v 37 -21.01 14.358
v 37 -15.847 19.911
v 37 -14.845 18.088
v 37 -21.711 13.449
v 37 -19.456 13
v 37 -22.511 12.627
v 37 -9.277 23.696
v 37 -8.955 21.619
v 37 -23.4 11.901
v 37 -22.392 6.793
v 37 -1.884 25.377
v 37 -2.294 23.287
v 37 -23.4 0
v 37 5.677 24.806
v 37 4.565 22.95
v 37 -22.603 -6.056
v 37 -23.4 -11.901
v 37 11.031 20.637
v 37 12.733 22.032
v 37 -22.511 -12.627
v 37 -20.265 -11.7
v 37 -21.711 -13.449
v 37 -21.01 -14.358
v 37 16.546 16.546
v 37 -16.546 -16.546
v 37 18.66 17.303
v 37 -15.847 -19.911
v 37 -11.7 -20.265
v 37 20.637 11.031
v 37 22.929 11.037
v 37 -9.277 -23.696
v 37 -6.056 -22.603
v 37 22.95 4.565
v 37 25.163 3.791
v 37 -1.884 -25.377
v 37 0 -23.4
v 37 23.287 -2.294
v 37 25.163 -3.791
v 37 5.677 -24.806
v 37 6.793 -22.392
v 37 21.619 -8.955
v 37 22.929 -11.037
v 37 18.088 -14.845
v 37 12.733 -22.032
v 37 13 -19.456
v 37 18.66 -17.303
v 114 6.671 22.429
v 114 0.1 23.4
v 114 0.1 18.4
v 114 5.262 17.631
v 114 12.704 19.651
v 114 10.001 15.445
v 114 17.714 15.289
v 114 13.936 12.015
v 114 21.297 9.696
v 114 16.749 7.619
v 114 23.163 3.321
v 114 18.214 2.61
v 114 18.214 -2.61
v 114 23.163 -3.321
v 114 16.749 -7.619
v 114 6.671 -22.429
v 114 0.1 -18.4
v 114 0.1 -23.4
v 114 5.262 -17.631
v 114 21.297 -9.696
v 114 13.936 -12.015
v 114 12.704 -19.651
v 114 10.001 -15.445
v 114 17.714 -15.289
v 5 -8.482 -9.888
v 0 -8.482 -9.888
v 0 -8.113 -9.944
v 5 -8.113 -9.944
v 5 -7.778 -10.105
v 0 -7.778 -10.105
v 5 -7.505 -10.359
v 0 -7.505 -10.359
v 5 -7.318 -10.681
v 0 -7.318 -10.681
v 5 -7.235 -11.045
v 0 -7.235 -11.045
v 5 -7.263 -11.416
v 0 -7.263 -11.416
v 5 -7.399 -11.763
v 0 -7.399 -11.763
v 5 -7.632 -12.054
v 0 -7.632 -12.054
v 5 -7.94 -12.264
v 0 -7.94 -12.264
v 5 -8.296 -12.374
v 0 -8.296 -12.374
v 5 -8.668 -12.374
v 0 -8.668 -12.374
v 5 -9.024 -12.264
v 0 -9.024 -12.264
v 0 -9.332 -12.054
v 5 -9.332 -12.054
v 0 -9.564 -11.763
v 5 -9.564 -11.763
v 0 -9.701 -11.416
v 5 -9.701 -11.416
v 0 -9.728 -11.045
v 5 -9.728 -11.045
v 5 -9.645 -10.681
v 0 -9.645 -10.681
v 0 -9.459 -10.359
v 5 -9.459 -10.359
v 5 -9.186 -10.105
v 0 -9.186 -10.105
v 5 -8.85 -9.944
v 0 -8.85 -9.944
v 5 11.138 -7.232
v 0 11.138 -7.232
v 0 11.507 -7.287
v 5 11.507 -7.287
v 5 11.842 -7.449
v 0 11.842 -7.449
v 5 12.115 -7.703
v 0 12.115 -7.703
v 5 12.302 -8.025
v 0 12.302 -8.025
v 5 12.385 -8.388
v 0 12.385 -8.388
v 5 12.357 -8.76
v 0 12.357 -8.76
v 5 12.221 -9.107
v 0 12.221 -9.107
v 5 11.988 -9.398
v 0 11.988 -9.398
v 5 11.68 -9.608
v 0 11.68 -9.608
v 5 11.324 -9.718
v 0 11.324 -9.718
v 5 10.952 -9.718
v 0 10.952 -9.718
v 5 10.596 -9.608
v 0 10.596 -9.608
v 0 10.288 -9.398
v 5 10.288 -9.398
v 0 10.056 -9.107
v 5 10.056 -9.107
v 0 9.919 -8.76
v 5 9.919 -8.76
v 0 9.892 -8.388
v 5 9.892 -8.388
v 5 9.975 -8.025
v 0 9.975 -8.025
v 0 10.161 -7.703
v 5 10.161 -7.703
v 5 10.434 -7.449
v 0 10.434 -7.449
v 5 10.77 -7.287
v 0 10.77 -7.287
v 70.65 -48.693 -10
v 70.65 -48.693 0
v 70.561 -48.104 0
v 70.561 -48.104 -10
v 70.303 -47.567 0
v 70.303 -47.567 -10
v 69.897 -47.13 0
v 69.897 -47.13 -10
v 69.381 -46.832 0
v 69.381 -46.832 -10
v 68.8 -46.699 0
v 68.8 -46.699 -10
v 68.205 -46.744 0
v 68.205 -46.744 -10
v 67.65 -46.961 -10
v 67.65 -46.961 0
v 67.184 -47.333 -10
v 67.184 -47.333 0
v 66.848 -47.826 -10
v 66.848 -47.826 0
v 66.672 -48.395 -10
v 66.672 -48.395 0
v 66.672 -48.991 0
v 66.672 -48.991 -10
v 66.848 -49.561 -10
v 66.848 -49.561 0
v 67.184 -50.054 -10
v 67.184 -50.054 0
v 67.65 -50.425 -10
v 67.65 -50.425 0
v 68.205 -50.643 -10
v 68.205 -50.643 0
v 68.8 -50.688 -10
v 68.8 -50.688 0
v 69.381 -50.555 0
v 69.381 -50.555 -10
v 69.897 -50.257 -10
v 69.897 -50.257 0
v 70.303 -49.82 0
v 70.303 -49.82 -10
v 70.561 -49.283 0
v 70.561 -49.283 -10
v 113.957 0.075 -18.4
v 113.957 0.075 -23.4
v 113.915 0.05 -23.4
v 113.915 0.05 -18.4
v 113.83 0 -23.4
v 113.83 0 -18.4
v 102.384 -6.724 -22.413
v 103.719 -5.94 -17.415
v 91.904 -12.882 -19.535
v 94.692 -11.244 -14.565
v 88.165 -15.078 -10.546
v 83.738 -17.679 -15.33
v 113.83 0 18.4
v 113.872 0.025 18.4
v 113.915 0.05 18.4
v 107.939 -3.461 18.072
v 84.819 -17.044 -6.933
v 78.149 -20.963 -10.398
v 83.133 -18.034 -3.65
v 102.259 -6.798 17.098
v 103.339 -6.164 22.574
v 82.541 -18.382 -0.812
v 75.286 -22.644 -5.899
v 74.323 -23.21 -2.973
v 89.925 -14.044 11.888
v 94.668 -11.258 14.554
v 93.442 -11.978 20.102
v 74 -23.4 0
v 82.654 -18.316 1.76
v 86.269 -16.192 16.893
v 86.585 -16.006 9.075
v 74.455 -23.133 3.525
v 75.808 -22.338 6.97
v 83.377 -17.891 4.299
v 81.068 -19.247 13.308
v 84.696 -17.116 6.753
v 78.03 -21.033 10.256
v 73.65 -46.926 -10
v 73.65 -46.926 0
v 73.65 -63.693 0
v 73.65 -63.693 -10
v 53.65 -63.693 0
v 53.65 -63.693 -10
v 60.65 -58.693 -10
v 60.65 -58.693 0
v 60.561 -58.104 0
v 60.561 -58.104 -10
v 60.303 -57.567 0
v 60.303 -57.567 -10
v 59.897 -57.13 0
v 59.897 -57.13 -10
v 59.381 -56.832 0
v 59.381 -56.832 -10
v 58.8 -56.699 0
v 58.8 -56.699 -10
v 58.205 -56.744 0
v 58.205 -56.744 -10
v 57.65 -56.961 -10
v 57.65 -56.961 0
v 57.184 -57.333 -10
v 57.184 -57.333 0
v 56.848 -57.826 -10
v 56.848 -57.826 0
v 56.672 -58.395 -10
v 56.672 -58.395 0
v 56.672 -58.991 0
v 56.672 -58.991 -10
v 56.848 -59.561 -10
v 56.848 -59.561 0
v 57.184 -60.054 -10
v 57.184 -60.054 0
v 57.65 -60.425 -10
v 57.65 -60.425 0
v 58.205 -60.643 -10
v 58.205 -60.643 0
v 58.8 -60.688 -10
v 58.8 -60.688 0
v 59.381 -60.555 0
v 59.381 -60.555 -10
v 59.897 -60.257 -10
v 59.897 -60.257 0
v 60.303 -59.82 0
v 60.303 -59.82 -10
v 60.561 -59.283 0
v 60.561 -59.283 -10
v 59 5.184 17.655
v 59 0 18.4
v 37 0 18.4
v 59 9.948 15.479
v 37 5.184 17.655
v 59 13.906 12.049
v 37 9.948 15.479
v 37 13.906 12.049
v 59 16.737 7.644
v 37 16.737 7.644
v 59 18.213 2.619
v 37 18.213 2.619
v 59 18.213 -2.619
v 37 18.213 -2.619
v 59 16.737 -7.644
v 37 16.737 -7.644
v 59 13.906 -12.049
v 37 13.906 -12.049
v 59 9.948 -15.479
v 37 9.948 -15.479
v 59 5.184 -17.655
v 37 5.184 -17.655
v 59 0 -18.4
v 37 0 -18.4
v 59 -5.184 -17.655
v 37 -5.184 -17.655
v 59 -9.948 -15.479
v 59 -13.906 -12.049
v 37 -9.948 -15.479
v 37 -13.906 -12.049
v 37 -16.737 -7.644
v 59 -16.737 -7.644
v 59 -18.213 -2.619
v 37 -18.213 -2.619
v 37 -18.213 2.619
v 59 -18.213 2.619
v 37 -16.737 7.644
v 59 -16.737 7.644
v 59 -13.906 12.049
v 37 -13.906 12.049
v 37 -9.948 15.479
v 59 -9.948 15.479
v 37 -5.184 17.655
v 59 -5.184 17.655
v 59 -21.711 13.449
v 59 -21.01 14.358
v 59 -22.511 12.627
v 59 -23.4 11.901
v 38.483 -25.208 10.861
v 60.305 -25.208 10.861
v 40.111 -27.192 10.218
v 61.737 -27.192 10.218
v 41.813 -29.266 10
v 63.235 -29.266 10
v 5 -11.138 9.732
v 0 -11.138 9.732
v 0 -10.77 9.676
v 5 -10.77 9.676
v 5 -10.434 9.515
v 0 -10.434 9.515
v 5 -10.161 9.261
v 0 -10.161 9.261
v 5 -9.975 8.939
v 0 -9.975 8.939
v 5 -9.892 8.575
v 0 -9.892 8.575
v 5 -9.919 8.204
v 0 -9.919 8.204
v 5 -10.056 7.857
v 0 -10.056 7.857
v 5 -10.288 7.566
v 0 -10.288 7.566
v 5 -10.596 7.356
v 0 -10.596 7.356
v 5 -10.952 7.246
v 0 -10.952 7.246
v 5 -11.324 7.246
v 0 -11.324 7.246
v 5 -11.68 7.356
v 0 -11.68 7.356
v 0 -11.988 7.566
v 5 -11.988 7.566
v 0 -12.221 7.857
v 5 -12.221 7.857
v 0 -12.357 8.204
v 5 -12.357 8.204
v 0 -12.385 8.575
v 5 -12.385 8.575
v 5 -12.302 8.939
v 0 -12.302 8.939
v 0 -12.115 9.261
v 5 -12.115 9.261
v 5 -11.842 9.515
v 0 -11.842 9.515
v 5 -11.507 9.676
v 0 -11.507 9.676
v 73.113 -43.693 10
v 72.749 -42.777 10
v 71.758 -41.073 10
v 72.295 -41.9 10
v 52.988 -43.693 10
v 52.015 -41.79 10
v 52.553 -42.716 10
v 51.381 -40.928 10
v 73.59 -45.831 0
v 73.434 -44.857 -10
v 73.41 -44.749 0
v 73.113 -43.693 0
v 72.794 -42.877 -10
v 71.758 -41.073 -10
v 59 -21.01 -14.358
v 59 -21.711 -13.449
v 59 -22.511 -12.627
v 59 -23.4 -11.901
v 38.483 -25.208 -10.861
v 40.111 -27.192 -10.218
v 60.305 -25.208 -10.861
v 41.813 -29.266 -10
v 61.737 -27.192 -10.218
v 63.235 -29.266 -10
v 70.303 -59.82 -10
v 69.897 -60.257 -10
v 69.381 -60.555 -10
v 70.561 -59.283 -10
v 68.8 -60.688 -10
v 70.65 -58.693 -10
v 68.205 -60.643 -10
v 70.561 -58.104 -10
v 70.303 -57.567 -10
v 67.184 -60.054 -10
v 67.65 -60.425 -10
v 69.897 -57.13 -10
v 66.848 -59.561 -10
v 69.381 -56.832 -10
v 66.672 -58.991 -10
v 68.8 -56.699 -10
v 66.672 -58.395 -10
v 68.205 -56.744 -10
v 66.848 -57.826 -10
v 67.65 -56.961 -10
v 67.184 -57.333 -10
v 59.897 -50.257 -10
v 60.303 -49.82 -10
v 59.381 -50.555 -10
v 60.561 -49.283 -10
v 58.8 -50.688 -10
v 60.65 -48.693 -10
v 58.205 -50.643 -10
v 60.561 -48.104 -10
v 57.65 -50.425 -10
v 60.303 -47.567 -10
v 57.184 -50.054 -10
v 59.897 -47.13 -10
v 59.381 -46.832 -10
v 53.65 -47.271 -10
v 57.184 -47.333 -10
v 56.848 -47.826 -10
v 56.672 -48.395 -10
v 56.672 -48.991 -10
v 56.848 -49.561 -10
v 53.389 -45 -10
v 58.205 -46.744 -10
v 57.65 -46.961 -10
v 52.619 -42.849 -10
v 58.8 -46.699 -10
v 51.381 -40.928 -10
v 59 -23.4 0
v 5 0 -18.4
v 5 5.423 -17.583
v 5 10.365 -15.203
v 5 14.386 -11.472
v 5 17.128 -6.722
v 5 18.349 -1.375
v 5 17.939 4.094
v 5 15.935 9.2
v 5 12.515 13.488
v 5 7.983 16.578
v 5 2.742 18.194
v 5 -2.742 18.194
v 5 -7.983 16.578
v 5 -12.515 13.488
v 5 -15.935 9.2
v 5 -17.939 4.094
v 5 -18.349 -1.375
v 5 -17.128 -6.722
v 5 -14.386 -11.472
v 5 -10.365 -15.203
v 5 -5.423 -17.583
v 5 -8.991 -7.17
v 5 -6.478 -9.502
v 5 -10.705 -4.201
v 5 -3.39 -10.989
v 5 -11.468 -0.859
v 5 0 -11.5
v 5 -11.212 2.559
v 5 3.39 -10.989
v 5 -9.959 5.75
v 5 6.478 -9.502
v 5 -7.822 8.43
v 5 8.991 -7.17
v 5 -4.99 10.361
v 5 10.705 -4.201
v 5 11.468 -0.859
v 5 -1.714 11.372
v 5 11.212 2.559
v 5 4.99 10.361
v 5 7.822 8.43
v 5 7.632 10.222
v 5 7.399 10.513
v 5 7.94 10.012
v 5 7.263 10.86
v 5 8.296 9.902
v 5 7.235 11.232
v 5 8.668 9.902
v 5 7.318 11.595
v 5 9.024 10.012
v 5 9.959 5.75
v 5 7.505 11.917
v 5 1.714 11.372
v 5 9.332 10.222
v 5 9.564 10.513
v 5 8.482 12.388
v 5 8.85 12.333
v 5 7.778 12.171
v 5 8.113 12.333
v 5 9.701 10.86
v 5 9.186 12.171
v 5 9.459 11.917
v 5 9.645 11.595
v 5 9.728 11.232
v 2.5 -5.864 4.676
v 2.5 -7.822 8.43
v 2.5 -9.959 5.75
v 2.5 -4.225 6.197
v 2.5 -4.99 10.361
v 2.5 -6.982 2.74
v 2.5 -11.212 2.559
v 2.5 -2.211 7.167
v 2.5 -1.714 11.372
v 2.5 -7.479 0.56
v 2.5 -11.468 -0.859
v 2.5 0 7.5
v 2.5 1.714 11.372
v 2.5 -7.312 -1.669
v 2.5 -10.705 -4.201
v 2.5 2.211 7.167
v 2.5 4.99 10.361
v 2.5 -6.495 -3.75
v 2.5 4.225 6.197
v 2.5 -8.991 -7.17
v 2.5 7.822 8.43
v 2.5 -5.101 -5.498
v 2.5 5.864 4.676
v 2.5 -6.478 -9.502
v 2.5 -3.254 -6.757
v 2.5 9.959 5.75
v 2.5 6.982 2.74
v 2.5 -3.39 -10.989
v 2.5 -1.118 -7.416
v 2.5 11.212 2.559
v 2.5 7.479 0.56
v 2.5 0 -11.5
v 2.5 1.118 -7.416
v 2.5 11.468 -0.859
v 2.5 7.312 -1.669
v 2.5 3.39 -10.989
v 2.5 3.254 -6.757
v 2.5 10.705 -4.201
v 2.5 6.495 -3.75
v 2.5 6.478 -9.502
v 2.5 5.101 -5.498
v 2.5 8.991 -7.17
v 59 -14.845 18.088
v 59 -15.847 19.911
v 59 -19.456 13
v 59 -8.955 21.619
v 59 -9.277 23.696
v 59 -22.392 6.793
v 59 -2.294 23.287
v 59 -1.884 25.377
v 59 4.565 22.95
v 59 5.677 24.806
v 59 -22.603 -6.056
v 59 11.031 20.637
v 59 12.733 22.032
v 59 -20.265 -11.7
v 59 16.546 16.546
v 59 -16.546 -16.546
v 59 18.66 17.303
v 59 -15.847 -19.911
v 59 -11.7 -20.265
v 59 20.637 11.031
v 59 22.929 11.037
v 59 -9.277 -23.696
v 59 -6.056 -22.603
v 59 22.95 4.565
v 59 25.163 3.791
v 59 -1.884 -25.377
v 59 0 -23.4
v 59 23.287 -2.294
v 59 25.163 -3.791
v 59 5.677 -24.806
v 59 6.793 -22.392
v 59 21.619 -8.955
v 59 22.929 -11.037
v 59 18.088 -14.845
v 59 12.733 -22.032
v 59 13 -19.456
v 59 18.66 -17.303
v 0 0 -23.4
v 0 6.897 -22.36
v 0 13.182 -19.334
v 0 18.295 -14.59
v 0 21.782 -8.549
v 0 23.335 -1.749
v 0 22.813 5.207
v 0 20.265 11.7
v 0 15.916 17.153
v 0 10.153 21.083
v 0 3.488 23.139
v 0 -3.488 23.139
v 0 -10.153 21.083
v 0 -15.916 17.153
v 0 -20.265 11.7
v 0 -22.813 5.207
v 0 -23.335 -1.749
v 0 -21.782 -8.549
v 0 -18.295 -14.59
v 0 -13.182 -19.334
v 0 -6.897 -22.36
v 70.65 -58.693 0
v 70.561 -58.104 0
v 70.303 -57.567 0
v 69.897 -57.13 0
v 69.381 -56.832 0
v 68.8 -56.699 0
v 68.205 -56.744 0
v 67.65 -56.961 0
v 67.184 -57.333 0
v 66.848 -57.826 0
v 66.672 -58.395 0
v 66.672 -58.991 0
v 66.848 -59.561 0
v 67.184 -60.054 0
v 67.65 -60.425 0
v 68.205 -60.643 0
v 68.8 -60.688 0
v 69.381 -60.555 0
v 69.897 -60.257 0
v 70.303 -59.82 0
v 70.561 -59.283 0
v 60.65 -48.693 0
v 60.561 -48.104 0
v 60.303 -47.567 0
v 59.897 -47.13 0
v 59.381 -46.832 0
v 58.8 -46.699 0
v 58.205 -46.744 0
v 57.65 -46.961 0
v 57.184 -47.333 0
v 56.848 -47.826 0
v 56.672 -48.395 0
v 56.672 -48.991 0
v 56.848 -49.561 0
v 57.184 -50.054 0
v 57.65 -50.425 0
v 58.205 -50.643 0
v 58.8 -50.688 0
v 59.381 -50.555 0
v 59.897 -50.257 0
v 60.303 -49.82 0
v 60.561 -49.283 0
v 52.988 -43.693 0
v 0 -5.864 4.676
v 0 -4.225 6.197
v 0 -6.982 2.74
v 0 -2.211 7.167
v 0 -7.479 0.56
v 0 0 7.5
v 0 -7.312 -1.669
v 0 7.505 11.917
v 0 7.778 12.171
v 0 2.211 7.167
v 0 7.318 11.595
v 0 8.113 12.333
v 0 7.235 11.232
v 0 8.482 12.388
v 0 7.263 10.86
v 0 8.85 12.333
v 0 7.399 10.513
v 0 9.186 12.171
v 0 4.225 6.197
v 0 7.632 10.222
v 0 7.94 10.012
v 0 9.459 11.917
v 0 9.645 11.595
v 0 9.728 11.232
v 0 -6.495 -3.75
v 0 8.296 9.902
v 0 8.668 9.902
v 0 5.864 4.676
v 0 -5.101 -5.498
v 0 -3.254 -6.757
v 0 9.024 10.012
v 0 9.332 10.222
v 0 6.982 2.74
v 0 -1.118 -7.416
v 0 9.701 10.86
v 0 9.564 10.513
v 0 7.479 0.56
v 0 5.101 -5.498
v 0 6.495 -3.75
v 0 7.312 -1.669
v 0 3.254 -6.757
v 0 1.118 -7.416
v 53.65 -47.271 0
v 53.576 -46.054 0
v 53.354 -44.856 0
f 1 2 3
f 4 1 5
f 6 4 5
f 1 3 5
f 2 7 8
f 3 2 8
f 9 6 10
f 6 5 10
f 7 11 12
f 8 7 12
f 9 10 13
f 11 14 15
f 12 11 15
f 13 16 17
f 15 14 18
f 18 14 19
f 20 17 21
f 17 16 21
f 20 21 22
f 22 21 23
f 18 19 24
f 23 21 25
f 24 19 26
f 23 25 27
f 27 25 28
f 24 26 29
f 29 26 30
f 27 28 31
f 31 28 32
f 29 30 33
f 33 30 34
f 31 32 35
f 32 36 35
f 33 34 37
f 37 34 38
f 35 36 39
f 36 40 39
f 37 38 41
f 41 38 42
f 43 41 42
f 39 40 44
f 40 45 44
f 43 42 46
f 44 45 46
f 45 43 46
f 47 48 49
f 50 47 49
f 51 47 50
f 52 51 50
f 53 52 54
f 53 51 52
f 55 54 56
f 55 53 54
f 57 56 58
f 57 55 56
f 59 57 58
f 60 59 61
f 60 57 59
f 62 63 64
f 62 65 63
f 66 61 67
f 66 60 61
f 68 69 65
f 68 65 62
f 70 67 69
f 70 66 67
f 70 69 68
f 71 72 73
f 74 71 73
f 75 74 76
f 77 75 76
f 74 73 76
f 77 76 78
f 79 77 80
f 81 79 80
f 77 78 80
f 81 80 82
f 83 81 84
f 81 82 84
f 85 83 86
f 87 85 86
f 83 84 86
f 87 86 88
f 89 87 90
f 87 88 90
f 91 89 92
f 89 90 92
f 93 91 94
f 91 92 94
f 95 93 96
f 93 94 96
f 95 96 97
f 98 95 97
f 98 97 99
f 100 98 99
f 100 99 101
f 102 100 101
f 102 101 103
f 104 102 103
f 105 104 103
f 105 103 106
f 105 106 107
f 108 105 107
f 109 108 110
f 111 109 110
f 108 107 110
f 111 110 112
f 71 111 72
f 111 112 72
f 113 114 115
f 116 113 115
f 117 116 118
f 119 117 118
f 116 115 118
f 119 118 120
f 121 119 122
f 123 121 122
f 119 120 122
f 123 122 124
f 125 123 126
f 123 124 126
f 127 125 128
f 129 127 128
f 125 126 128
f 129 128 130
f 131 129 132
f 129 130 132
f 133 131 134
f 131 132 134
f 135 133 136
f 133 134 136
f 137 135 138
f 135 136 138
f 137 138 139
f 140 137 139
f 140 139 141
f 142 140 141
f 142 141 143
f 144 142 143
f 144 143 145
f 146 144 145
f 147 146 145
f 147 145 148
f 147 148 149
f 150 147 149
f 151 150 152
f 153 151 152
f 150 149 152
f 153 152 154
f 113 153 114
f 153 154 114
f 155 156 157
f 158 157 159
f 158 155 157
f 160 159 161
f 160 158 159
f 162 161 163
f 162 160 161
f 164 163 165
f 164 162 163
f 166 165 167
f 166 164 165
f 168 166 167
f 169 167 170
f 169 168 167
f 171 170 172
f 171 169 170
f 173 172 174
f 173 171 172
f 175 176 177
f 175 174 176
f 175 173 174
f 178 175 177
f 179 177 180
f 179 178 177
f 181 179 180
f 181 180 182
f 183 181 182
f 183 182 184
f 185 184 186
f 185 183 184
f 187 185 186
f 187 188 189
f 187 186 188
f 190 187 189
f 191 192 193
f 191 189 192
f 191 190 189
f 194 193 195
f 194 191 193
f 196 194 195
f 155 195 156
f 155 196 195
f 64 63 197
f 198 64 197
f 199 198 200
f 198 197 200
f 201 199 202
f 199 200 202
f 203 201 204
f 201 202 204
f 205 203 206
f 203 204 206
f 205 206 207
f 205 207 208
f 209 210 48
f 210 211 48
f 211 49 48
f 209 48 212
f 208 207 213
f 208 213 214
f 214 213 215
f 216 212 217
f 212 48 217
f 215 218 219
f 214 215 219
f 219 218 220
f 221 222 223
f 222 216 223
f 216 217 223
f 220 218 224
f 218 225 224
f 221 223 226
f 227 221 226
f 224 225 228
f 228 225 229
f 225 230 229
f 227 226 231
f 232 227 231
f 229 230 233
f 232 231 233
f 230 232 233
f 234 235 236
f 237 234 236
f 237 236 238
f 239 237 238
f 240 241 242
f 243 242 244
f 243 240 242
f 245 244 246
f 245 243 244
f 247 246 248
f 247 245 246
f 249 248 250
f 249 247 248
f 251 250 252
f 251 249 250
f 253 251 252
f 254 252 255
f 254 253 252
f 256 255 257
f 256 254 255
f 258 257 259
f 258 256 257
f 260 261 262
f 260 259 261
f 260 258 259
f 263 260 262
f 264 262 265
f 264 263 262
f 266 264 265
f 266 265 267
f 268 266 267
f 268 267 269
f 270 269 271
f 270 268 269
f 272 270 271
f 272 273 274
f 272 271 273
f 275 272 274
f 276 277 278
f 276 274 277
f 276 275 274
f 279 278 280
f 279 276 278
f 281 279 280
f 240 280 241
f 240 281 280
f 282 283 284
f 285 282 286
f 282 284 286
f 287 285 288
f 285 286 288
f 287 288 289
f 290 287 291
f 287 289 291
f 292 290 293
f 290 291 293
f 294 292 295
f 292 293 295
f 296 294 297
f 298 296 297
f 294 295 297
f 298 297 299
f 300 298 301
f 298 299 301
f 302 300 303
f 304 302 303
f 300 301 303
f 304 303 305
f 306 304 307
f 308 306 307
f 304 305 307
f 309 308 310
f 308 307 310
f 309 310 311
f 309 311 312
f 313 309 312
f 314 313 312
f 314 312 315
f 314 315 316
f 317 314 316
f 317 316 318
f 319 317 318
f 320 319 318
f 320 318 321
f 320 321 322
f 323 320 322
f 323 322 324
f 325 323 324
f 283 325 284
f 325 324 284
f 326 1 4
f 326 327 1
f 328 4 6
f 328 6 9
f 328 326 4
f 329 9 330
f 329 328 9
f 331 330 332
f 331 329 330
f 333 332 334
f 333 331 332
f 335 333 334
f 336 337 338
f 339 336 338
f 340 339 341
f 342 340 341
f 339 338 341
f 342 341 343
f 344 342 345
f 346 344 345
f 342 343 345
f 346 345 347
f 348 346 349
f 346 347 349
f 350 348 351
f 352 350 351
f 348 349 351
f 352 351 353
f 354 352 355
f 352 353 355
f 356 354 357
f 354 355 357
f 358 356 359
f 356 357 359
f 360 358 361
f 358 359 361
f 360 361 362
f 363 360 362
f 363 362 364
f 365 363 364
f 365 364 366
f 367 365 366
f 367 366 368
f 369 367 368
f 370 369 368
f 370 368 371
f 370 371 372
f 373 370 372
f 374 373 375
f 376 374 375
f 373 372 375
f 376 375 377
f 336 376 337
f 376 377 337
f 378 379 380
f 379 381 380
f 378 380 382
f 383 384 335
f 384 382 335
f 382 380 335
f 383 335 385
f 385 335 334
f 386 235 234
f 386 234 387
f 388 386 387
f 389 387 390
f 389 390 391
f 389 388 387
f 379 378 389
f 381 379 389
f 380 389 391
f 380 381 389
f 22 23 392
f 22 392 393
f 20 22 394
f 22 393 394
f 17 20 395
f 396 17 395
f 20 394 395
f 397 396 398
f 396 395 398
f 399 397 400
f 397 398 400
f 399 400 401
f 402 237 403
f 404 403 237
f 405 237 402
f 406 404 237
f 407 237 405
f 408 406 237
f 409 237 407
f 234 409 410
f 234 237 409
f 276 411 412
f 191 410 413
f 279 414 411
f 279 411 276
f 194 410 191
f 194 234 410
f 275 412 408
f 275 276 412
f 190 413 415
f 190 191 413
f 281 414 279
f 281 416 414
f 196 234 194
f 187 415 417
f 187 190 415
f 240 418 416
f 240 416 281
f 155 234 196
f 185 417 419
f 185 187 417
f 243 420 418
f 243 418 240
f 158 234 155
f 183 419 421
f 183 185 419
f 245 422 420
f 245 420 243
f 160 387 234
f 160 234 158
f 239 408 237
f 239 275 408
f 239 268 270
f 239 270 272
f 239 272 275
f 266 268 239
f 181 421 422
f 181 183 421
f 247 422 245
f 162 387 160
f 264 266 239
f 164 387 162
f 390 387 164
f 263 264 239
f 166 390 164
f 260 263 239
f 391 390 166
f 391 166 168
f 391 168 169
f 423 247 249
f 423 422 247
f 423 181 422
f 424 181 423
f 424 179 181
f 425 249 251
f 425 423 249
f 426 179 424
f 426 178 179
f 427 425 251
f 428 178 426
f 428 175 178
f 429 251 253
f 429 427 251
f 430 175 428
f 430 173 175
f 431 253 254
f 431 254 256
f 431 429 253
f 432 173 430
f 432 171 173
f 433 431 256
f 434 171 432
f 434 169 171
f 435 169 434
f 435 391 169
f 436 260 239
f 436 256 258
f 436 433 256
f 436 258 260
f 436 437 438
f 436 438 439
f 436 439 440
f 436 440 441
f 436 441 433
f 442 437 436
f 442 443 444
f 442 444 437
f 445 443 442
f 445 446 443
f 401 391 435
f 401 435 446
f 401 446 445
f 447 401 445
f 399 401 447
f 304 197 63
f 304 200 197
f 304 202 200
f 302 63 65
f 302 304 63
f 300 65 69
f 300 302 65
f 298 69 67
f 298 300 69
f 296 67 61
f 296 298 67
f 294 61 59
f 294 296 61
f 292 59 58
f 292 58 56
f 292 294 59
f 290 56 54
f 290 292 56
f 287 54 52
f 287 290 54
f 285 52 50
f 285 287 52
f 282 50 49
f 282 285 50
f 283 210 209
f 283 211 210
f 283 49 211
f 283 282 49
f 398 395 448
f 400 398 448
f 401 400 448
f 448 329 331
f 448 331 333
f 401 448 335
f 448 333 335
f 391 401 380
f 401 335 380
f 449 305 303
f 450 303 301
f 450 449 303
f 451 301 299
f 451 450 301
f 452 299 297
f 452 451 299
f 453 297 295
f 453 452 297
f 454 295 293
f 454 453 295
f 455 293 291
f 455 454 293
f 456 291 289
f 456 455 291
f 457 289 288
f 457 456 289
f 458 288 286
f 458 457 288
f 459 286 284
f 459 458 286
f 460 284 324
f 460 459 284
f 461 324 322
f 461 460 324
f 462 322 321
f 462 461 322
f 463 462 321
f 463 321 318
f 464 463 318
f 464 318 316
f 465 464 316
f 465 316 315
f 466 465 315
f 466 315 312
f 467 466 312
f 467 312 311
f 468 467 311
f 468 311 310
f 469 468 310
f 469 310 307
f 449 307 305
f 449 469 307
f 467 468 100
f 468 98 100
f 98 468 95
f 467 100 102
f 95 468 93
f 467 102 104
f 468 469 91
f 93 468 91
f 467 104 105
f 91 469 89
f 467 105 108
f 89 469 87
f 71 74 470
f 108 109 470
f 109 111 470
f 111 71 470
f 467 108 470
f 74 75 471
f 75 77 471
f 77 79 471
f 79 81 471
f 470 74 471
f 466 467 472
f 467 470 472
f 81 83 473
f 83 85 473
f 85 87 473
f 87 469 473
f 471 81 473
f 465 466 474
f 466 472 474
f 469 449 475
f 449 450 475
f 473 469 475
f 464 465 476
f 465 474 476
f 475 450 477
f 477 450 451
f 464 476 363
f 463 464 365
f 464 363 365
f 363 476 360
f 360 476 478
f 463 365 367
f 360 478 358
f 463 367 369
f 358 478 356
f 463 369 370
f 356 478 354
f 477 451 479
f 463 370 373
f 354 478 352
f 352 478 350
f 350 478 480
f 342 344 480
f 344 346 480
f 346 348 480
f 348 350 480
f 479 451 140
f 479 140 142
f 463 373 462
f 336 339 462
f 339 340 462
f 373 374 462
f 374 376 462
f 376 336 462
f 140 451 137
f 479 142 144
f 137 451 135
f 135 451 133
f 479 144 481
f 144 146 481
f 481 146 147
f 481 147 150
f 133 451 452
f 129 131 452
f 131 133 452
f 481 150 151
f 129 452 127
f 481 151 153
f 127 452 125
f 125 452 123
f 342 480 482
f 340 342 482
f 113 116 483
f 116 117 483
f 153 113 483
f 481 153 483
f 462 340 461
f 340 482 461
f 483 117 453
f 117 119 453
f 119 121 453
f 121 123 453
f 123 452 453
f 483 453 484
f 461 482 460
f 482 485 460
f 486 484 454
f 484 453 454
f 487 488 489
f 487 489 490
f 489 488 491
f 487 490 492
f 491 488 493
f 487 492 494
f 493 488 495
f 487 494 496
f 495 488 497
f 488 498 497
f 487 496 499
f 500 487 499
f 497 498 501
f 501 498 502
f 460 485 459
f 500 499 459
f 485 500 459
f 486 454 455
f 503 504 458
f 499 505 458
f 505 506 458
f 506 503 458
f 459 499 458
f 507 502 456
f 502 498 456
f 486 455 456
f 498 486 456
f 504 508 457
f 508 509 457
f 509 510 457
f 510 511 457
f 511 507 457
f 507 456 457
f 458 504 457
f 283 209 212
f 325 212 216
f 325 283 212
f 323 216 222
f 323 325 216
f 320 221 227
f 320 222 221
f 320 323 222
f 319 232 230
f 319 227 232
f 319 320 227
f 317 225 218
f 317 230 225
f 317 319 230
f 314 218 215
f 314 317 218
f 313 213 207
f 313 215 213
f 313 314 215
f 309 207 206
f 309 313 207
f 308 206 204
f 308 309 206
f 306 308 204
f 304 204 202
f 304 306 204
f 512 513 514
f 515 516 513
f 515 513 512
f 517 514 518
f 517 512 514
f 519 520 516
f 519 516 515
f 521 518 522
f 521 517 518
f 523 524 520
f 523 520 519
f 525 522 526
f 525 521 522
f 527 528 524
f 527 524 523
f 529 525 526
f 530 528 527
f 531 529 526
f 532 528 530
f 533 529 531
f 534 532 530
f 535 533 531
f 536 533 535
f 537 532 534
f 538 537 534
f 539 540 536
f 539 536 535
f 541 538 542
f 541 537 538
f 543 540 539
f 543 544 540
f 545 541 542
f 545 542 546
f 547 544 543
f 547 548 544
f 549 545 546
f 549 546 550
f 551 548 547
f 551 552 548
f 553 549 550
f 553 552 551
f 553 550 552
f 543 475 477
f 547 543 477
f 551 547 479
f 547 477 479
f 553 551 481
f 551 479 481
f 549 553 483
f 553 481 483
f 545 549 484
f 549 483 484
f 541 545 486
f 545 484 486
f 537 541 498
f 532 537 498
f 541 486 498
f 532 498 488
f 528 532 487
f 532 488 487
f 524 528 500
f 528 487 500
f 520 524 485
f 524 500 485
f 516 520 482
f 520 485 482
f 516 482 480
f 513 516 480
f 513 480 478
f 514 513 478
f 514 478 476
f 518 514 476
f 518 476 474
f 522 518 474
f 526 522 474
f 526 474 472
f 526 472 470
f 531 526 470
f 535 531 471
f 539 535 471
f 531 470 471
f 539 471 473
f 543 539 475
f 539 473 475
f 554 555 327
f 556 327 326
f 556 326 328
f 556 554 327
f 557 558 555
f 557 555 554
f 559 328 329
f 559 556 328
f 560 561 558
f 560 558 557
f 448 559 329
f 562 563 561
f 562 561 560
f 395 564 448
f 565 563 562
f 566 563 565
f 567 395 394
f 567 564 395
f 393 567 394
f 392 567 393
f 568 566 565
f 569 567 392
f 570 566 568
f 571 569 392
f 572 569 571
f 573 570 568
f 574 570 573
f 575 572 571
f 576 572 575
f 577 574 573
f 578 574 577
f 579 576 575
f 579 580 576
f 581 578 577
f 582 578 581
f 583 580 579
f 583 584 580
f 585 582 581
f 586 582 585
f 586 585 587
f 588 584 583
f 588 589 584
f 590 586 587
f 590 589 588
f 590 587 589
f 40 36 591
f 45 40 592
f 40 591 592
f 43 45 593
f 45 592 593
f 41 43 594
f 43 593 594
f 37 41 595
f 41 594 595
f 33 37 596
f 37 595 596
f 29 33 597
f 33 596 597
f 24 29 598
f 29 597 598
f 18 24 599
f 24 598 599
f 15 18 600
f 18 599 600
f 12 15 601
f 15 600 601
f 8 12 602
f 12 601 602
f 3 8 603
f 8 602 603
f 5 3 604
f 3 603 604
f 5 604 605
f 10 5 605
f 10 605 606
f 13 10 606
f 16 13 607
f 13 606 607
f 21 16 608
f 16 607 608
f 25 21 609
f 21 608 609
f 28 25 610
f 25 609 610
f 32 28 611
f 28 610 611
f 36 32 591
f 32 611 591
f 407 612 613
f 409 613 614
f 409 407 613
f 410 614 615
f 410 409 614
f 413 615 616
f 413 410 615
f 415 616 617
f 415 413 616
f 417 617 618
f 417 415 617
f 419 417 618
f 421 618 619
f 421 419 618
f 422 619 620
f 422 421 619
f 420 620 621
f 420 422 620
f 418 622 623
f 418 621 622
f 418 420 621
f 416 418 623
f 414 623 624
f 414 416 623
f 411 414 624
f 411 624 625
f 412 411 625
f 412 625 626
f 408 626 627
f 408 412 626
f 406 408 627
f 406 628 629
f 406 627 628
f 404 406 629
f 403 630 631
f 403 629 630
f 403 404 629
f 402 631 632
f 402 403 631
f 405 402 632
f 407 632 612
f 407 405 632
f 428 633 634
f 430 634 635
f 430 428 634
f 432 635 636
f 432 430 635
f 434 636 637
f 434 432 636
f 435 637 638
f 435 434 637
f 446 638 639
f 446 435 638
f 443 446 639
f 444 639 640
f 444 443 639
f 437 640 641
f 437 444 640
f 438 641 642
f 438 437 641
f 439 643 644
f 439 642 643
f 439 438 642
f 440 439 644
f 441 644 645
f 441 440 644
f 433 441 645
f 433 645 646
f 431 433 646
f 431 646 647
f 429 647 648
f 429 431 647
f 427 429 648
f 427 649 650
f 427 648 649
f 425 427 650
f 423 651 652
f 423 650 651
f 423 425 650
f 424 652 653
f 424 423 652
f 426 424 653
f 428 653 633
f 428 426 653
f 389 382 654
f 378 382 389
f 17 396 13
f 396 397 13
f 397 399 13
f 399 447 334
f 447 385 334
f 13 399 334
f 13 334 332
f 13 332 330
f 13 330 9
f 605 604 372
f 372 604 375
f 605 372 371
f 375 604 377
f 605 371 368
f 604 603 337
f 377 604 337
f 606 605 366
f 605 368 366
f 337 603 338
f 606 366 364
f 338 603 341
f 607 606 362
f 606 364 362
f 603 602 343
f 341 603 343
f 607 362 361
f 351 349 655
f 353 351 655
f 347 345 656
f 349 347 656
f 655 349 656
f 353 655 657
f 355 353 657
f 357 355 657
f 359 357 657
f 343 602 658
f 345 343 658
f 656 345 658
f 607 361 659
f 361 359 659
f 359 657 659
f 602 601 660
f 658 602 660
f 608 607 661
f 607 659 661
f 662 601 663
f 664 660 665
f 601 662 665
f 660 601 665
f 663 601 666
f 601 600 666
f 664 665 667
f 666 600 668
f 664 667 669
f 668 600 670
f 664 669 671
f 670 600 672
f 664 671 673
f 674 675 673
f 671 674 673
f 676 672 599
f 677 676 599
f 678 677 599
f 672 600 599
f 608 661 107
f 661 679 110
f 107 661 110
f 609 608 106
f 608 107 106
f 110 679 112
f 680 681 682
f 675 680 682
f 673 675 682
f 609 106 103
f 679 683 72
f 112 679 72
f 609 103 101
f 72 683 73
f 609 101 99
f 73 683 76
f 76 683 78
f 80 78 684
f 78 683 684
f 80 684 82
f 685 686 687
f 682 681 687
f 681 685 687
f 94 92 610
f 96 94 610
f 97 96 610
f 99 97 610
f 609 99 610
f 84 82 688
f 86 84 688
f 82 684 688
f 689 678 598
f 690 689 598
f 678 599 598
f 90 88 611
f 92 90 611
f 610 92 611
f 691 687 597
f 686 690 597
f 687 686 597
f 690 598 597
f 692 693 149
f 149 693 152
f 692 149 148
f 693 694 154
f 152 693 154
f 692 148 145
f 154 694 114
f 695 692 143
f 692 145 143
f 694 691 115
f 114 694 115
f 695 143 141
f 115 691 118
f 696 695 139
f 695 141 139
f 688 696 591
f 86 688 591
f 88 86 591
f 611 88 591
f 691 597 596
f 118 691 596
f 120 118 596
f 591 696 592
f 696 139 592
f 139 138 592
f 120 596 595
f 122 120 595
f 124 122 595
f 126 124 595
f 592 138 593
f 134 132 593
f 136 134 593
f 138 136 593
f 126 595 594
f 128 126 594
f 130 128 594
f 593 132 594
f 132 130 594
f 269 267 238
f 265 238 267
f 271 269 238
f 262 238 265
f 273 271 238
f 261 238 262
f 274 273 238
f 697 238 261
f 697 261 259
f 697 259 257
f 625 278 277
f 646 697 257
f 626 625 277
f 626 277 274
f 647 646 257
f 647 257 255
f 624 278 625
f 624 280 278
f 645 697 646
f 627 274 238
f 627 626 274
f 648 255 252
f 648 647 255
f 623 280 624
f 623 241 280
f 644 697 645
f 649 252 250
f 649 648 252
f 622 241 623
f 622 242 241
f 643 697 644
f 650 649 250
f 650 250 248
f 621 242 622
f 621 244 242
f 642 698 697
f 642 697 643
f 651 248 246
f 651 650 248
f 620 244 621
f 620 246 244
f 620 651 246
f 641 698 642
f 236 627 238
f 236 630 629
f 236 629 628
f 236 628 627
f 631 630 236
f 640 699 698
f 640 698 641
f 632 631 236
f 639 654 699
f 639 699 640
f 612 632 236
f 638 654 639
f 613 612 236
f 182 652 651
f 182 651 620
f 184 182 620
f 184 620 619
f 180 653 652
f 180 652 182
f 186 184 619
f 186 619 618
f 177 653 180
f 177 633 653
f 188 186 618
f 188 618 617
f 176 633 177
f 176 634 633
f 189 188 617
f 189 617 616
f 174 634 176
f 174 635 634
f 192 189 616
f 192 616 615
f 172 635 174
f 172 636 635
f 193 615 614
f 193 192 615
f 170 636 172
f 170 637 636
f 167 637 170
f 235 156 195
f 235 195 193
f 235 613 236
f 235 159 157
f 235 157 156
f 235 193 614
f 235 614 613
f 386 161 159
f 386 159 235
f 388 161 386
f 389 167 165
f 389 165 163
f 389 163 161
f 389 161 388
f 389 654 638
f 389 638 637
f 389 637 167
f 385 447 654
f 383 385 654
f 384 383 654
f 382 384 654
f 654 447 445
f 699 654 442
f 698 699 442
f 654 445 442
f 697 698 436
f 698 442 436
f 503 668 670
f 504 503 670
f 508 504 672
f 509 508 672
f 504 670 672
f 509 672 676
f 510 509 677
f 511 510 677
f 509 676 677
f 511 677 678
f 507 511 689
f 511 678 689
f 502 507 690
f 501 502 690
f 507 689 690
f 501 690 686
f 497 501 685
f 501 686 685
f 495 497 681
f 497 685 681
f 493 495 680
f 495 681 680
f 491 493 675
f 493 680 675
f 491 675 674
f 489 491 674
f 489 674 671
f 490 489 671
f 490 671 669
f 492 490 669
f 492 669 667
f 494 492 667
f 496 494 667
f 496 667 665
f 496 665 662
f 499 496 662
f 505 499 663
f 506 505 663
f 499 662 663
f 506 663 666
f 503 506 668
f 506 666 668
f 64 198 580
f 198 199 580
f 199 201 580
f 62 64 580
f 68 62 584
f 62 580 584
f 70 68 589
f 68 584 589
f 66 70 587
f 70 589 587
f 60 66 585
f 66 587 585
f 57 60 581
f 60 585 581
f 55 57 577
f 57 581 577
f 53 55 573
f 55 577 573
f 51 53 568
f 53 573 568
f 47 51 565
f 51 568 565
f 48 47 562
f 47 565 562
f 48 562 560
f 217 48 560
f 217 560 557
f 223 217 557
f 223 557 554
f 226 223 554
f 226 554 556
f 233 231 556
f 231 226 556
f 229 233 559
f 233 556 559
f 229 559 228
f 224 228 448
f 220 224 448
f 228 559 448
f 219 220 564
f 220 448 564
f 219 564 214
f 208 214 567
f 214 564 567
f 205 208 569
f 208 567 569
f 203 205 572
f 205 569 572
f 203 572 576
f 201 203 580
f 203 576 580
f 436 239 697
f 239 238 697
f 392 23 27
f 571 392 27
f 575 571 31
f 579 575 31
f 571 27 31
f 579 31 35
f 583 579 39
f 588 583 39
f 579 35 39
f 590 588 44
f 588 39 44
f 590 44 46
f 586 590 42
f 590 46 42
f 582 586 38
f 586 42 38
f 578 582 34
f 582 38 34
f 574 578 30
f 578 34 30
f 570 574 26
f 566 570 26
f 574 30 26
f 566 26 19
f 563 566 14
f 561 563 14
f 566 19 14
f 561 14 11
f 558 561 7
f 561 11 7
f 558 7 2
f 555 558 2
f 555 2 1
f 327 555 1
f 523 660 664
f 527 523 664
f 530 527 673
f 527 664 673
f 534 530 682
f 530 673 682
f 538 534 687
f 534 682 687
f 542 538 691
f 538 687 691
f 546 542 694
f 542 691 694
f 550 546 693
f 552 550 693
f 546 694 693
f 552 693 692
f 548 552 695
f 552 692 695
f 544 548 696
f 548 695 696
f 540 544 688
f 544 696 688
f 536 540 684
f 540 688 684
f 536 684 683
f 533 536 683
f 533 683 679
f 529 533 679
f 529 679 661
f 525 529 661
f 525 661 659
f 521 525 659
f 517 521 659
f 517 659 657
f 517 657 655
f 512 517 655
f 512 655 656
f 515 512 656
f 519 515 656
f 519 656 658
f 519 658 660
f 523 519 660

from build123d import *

# Parameters (mm, degrees)
CROQUIS1_R              = 23.4
CROQUIS1_R_2            = 18.4
SALIENTE_EXTRUIR1_DEPTH = 114
CROQUIS2_R              = 23.4
CROQUIS2_R_2            = 7.5
CROQUIS2_R_3            = 1.25
SALIENTE_EXTRUIR2_DEPTH = 5
CORTAR_EXTRUIR1_DEPTH   = 23.5
CROQUIS6_R              = 11.5
CORTAR_EXTRUIR2_DEPTH   = 2.5
CROQUIS9_R              = 2
SALIENTE_EXTRUIR3_DEPTH = 10
REDONDEO3_R             = 10
CROQUIS10_W             = 23.154362093
CROQUIS10_H             = 20
CORTAR_EXTRUIR3_DEPTH   = 10
SALIENTE_EXTRUIR4_DEPTH = 22
REDONDEO1_R             = 10
CROQUIS12_R             = 18.4
CORTAR_EXTRUIR4_DEPTH   = 78


with BuildPart() as part:
    # Croquis1 → Saliente-Extruir1 (new body)
    with BuildSketch(Plane(origin=(0, 0, 0), x_dir=(0, 0, -1), z_dir=(1, 0, 0))):
        Circle(CROQUIS1_R)
        Circle(CROQUIS1_R_2, mode=Mode.SUBTRACT)
    extrude(amount=SALIENTE_EXTRUIR1_DEPTH)

    # Croquis2 → Saliente-Extruir2 (add)
    with BuildSketch(Plane.ZY):
        Circle(CROQUIS2_R)
        Circle(CROQUIS2_R_2, mode=Mode.SUBTRACT)
        with Locations((-11.138131171, -8.481865008)):
            Circle(CROQUIS2_R_3, mode=Mode.SUBTRACT)
        with Locations((8.481865008, -11.138131171)):
            Circle(CROQUIS2_R_3, mode=Mode.SUBTRACT)
        with Locations((11.138131171, 8.481865008)):
            Circle(CROQUIS2_R_3, mode=Mode.SUBTRACT)
        with Locations((-8.481865008, 11.138131171)):
            Circle(CROQUIS2_R_3, mode=Mode.SUBTRACT)
    extrude(amount=-SALIENTE_EXTRUIR2_DEPTH)

    # Croquis4 → Cortar-Extruir1 (cut, symmetric)
    with BuildSketch(Plane.XY):
        Polygon((114, 0.1), (74, -23.4), (114, -23.4), align=None)
    extrude(amount=CORTAR_EXTRUIR1_DEPTH, both=True, mode=Mode.SUBTRACT)

    # Croquis6 → Cortar-Extruir2 (cut)
    with BuildSketch(Plane(origin=(5, 0, 0), x_dir=(0, 0, -1), z_dir=(1, 0, 0))):
        Circle(CROQUIS6_R)
    extrude(amount=-CORTAR_EXTRUIR2_DEPTH, mode=Mode.SUBTRACT)



with BuildPart() as body_2:
    # Croquis9 → Saliente-Extruir3 (new body, symmetric)
    with BuildSketch(Plane.XY):
        Polygon((73.650159213, -43.69341218), (73.650159213, -63.69341218), (53.650159213, -63.69341218), (53.650159213, -43.69341218), (37, -23.4), (59, -23.4), align=None)
        with Locations((58.650159213, -48.69341218)):
            Circle(CROQUIS9_R, mode=Mode.SUBTRACT)
        with Locations((58.650159213, -58.69341218)):
            Circle(CROQUIS9_R, mode=Mode.SUBTRACT)
        with Locations((68.650159213, -58.69341218)):
            Circle(CROQUIS9_R, mode=Mode.SUBTRACT)
        with Locations((68.650159213, -48.69341218)):
            Circle(CROQUIS9_R, mode=Mode.SUBTRACT)
    extrude(amount=SALIENTE_EXTRUIR3_DEPTH, both=True)

    # Redondeo3
    redondeo3_edges = [body_2.edges().sort_by_distance(p)[0] for p in [
        (53.650159213, -43.69341218, 0),
        (73.650159213, -43.69341218, 0),
    ]]
    fillet(redondeo3_edges, radius=REDONDEO3_R)

    # Croquis10 → Cortar-Extruir3 (cut)
    with BuildSketch(Plane.XY.offset(10)):
        with Locations((62.072978167, -53.69341218)):
            Rectangle(CROQUIS10_W, CROQUIS10_H)
    extrude(amount=-CORTAR_EXTRUIR3_DEPTH, mode=Mode.SUBTRACT)


with BuildPart() as part_1:
    add(part.part)

    add(body_2.part)  # Saliente-Extruir4 merges body 2
    # Croquis11 → Saliente-Extruir4 (add)
    with BuildSketch(Plane(origin=(37, 0, 0), x_dir=(0, 0, -1), z_dir=(1, 0, 0))):
        with BuildLine():
            Line((-10, -23.4), (10, -23.4))
            ThreePointArc((10, -23.4), (0, 25.447200239), (-10, -23.4))
        make_face()
    extrude(amount=SALIENTE_EXTRUIR4_DEPTH)

    # Redondeo1
    redondeo1_edges = [part_1.edges().sort_by_distance(p)[0] for p in [
        (48, -23.4, -10),
        (48, -23.4, 10),
    ]]
    fillet(redondeo1_edges, radius=REDONDEO1_R)

    # Croquis12 → Cortar-Extruir4 (cut, through all)
    with BuildSketch(Plane.ZY.offset(-37)):
        Circle(CROQUIS12_R)
    extrude(amount=-CORTAR_EXTRUIR4_DEPTH, mode=Mode.SUBTRACT)


solid = part_1.part
